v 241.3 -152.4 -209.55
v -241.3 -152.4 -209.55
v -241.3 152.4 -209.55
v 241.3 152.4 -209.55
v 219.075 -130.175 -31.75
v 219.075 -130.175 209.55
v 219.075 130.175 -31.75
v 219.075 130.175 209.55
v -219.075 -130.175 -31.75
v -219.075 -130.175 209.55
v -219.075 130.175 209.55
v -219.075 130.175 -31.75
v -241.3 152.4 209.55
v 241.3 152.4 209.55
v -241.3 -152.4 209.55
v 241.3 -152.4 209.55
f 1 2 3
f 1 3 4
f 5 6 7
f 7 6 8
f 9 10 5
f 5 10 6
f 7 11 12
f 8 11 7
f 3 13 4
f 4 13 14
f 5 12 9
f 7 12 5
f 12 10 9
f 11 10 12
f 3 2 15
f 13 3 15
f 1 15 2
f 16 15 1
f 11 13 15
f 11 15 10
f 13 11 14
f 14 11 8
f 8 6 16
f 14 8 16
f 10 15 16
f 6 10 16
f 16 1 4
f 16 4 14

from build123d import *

# Parameters (mm, degrees)
F0_W     = 482.6
F0_H     = 419.1
F1_DEPTH = 152.4
F2_W     = 438.15
F2_H     = 260.35
F3_DEPTH = 241.3


with BuildPart() as f1:
    # F0 (on Front) → F1 (new body, symmetric)
    with BuildSketch(Plane.XZ):
        Rectangle(F0_W, F0_H)
    extrude(amount=F1_DEPTH, both=True)

    # F2 (on face) → F3 (cut, symmetric)
    with BuildSketch(Plane.XY.offset(209.55)):
        Rectangle(F2_W, F2_H)
    extrude(amount=F3_DEPTH, both=True, mode=Mode.SUBTRACT)


solid = f1.part
